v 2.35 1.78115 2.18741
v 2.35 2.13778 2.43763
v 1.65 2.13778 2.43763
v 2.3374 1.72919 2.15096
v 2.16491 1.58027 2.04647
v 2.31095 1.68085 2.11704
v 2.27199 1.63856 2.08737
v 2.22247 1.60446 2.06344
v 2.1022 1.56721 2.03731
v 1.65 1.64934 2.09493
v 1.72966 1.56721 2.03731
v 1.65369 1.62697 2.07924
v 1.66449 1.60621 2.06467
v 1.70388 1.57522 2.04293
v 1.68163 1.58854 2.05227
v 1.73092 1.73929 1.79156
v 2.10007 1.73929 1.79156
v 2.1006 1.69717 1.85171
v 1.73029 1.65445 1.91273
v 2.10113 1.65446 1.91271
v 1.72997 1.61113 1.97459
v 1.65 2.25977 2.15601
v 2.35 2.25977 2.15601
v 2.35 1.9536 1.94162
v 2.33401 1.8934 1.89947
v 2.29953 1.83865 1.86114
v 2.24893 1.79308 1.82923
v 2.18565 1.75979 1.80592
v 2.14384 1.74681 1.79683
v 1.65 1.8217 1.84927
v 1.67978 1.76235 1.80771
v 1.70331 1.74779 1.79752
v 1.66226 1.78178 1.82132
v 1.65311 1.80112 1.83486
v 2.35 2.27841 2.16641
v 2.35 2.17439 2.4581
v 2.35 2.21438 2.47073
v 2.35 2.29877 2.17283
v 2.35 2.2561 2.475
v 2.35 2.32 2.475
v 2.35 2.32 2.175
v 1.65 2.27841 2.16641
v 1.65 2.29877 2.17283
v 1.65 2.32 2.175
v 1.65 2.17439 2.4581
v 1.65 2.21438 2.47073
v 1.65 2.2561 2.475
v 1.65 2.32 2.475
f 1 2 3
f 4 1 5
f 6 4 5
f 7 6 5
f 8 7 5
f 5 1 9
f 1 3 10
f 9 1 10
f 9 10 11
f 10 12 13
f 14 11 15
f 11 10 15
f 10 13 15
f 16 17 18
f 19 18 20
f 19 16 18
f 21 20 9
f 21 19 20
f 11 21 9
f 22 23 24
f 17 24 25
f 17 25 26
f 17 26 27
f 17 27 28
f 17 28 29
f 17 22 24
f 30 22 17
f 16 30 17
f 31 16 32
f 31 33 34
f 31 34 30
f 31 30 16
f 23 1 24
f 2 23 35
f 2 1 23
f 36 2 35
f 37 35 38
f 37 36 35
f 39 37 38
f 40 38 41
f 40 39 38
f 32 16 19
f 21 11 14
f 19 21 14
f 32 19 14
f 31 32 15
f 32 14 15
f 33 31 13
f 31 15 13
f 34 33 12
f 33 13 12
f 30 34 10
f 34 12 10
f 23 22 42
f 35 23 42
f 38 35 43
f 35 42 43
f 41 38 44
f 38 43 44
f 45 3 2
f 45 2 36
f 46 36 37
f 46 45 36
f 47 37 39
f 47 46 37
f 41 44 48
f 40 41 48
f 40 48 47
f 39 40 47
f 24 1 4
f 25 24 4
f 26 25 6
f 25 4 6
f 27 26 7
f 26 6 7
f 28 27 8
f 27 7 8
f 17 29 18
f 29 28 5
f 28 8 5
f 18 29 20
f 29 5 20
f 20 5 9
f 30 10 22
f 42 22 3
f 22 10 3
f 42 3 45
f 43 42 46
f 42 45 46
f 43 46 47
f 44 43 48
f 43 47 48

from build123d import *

# Parameters (mm, degrees)
PAD011_DEPTH    = 0.7
POCKET010_DEPTH = 0.6345351801


with BuildPart() as pocket010:
    # Sketch022 → Pad011 (new body)
    with BuildSketch(Plane(origin=(1.6500000167, -2.3199999803, 2.1749995953), x_dir=(0, 1, 0), z_dir=(1, 0, 0))):
        with BuildLine():
            Line((0, 0), (0, 0.3))
            Line((0, 0.3), (0.0639, 0.3))
            ThreePointArc((0.1822171332, 0.262632903), (0.1259387861, 0.2904362212), (0.0639, 0.3))
            Line((0.1822171332, 0.262632903), (0.7527857421, -0.1376925428))
            Line((0.5807128112, -0.3834381561), (0.7527857421, -0.1376925428))
            Line((0.0602255258, -0.0189890353), (0.5807128112, -0.3834381561))
            ThreePointArc((0.0602255258, -0.0189890353), (0.0315741089, -0.0048597202), (0, 0))
        make_face()
    extrude(amount=PAD011_DEPTH)

    # Sketch023 (on Face5 of Pad011) → Pocket010 (cut, through all)
    with BuildSketch(Plane(origin=(1.6500000167, -2.1364072387, 2.4366673365), x_dir=(0, -0.8186063255, 0.5743550156), z_dir=(0, 0.5743550156, 0.8186063255))):
        with BuildLine():
            ThreePointArc((-0.698, 0.103), (-0.6678319985, 0.0301680015), (-0.595, 0))
            Line((-0.595, 0), (-0.748, 0))
            Line((-0.748, 0.701), (-0.748, 0))
            Line((-0.41, 0.701), (-0.748, 0.701))
            ThreePointArc((-0.41, 0.701), (-0.613646753, 0.616646753), (-0.698, 0.413))
            Line((-0.698, 0.413), (-0.698, 0.103))
        make_face()
    extrude(amount=-POCKET010_DEPTH, mode=Mode.SUBTRACT)


with BuildPart() as part_mirroring004:
    # Part__Mirroring004: instance of Pocket010
    add(pocket010.part.mirror(Plane(origin=(0, 0, 0), x_dir=(1, 0, 0), z_dir=(0, 1, 0))))


solid = part_mirroring004.part
